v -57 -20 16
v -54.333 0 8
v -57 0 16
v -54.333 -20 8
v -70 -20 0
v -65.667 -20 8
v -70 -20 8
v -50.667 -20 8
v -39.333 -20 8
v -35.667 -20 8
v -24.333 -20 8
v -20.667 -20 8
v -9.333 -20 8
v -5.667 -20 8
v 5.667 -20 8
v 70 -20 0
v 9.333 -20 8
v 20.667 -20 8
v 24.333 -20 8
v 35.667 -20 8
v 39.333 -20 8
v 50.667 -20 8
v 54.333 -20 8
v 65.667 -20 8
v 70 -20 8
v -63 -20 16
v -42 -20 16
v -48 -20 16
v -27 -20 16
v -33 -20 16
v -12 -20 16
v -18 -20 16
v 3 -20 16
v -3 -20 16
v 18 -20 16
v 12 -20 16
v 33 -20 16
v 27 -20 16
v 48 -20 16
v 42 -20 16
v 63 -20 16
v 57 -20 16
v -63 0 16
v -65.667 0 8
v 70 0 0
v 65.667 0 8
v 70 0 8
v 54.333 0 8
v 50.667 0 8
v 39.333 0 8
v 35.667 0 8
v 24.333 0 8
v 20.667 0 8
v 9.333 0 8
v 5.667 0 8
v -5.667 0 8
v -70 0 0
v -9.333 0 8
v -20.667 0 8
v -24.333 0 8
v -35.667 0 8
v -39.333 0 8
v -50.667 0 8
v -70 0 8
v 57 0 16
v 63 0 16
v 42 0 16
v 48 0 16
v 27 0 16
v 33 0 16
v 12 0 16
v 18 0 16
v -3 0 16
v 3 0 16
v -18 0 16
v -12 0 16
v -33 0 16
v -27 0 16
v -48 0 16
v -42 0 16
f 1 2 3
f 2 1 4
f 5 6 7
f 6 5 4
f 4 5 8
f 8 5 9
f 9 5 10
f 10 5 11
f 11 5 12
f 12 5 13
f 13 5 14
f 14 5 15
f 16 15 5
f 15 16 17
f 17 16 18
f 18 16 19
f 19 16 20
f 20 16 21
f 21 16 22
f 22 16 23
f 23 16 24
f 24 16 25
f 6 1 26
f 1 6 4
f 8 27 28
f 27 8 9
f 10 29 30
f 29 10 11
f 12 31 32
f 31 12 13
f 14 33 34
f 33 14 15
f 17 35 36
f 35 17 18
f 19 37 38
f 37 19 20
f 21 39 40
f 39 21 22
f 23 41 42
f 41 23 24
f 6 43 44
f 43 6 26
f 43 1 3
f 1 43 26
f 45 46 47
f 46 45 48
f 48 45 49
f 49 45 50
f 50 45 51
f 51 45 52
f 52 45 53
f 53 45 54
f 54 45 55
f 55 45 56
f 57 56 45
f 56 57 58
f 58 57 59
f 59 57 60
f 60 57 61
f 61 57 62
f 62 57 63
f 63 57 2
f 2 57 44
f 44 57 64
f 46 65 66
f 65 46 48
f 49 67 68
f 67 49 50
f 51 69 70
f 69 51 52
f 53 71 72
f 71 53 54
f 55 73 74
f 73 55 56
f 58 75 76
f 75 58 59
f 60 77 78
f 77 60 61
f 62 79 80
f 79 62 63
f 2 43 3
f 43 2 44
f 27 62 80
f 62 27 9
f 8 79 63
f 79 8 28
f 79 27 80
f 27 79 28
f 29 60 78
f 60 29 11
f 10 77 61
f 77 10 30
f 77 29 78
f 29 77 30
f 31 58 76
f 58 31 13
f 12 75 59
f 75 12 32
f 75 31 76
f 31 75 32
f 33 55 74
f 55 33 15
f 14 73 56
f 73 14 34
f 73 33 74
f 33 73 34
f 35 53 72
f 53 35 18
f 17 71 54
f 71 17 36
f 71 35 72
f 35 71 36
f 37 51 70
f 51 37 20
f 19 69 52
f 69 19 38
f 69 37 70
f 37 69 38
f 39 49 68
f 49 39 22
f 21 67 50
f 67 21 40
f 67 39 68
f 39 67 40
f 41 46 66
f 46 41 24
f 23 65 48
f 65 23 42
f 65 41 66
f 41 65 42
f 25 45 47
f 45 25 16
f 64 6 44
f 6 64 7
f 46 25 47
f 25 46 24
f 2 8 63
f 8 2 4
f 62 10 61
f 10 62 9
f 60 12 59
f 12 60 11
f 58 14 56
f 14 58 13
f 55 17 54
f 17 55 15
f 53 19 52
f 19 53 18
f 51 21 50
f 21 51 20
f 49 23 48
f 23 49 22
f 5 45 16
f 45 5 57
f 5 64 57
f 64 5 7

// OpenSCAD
$fn = 32;

// ----------------------------------------------------------------------
// Toothed rack, 9 teeth
// 15 mm pitch, 8 mm teeth
// ----------------------------------------------------------------------

// --- parameters (mm) ---
bar_w = 20;   // bar width (Y)
bar_h = 8;    // bar height (Z)
teeth = 9;    // number of teeth
pitch = 15;   // tooth pitch
tooth_h = 8;  // tooth height above the bar
root_w = 12;  // tooth width at the root
crest_w = 6;  // tooth width at the crest

// --- derived feature positions (mm) ---
span = (teeth - 1) * pitch;  // = 120   distance between the outer teeth
bar_l = span + root_w + 8;   // = 140   bar length: teeth plus 4 mm at each end
tooth_x = -span / 2;         // = -60   X of the first tooth
height = bar_h + tooth_h;    // = 16   overall height
feature_centers = [
  [tooth_x + 0 * pitch, -bar_w / 2],
  [tooth_x + 1 * pitch, -bar_w / 2],
  [tooth_x + 2 * pitch, -bar_w / 2],
  [tooth_x + 3 * pitch, -bar_w / 2],
  [tooth_x + 4 * pitch, -bar_w / 2],
  [tooth_x + 5 * pitch, -bar_w / 2],
  [tooth_x + 6 * pitch, -bar_w / 2],
  [tooth_x + 7 * pitch, -bar_w / 2],
  [tooth_x + 8 * pitch, -bar_w / 2]
];   // tooth centre line, drives the tooth loop

// bar with a rack of teeth, one extruded trapezoium per centre
module rack_tooth() {
  linear_extrude(height = bar_w)
    polygon(points = [
      [0, 0],
      [root_w, 0],
      [root_w / 2 + crest_w / 2, tooth_h + 1],
      [root_w / 2 - crest_w / 2, tooth_h + 1]
    ]);
}

union() {
  translate([-bar_l / 2, -bar_w, 0]) cube([bar_l, bar_w, bar_h]);
  for (centre = feature_centers)
    translate([centre[0] - root_w / 2, 0, bar_h - 1]) rotate([90, 0, 0]) rack_tooth();
}
